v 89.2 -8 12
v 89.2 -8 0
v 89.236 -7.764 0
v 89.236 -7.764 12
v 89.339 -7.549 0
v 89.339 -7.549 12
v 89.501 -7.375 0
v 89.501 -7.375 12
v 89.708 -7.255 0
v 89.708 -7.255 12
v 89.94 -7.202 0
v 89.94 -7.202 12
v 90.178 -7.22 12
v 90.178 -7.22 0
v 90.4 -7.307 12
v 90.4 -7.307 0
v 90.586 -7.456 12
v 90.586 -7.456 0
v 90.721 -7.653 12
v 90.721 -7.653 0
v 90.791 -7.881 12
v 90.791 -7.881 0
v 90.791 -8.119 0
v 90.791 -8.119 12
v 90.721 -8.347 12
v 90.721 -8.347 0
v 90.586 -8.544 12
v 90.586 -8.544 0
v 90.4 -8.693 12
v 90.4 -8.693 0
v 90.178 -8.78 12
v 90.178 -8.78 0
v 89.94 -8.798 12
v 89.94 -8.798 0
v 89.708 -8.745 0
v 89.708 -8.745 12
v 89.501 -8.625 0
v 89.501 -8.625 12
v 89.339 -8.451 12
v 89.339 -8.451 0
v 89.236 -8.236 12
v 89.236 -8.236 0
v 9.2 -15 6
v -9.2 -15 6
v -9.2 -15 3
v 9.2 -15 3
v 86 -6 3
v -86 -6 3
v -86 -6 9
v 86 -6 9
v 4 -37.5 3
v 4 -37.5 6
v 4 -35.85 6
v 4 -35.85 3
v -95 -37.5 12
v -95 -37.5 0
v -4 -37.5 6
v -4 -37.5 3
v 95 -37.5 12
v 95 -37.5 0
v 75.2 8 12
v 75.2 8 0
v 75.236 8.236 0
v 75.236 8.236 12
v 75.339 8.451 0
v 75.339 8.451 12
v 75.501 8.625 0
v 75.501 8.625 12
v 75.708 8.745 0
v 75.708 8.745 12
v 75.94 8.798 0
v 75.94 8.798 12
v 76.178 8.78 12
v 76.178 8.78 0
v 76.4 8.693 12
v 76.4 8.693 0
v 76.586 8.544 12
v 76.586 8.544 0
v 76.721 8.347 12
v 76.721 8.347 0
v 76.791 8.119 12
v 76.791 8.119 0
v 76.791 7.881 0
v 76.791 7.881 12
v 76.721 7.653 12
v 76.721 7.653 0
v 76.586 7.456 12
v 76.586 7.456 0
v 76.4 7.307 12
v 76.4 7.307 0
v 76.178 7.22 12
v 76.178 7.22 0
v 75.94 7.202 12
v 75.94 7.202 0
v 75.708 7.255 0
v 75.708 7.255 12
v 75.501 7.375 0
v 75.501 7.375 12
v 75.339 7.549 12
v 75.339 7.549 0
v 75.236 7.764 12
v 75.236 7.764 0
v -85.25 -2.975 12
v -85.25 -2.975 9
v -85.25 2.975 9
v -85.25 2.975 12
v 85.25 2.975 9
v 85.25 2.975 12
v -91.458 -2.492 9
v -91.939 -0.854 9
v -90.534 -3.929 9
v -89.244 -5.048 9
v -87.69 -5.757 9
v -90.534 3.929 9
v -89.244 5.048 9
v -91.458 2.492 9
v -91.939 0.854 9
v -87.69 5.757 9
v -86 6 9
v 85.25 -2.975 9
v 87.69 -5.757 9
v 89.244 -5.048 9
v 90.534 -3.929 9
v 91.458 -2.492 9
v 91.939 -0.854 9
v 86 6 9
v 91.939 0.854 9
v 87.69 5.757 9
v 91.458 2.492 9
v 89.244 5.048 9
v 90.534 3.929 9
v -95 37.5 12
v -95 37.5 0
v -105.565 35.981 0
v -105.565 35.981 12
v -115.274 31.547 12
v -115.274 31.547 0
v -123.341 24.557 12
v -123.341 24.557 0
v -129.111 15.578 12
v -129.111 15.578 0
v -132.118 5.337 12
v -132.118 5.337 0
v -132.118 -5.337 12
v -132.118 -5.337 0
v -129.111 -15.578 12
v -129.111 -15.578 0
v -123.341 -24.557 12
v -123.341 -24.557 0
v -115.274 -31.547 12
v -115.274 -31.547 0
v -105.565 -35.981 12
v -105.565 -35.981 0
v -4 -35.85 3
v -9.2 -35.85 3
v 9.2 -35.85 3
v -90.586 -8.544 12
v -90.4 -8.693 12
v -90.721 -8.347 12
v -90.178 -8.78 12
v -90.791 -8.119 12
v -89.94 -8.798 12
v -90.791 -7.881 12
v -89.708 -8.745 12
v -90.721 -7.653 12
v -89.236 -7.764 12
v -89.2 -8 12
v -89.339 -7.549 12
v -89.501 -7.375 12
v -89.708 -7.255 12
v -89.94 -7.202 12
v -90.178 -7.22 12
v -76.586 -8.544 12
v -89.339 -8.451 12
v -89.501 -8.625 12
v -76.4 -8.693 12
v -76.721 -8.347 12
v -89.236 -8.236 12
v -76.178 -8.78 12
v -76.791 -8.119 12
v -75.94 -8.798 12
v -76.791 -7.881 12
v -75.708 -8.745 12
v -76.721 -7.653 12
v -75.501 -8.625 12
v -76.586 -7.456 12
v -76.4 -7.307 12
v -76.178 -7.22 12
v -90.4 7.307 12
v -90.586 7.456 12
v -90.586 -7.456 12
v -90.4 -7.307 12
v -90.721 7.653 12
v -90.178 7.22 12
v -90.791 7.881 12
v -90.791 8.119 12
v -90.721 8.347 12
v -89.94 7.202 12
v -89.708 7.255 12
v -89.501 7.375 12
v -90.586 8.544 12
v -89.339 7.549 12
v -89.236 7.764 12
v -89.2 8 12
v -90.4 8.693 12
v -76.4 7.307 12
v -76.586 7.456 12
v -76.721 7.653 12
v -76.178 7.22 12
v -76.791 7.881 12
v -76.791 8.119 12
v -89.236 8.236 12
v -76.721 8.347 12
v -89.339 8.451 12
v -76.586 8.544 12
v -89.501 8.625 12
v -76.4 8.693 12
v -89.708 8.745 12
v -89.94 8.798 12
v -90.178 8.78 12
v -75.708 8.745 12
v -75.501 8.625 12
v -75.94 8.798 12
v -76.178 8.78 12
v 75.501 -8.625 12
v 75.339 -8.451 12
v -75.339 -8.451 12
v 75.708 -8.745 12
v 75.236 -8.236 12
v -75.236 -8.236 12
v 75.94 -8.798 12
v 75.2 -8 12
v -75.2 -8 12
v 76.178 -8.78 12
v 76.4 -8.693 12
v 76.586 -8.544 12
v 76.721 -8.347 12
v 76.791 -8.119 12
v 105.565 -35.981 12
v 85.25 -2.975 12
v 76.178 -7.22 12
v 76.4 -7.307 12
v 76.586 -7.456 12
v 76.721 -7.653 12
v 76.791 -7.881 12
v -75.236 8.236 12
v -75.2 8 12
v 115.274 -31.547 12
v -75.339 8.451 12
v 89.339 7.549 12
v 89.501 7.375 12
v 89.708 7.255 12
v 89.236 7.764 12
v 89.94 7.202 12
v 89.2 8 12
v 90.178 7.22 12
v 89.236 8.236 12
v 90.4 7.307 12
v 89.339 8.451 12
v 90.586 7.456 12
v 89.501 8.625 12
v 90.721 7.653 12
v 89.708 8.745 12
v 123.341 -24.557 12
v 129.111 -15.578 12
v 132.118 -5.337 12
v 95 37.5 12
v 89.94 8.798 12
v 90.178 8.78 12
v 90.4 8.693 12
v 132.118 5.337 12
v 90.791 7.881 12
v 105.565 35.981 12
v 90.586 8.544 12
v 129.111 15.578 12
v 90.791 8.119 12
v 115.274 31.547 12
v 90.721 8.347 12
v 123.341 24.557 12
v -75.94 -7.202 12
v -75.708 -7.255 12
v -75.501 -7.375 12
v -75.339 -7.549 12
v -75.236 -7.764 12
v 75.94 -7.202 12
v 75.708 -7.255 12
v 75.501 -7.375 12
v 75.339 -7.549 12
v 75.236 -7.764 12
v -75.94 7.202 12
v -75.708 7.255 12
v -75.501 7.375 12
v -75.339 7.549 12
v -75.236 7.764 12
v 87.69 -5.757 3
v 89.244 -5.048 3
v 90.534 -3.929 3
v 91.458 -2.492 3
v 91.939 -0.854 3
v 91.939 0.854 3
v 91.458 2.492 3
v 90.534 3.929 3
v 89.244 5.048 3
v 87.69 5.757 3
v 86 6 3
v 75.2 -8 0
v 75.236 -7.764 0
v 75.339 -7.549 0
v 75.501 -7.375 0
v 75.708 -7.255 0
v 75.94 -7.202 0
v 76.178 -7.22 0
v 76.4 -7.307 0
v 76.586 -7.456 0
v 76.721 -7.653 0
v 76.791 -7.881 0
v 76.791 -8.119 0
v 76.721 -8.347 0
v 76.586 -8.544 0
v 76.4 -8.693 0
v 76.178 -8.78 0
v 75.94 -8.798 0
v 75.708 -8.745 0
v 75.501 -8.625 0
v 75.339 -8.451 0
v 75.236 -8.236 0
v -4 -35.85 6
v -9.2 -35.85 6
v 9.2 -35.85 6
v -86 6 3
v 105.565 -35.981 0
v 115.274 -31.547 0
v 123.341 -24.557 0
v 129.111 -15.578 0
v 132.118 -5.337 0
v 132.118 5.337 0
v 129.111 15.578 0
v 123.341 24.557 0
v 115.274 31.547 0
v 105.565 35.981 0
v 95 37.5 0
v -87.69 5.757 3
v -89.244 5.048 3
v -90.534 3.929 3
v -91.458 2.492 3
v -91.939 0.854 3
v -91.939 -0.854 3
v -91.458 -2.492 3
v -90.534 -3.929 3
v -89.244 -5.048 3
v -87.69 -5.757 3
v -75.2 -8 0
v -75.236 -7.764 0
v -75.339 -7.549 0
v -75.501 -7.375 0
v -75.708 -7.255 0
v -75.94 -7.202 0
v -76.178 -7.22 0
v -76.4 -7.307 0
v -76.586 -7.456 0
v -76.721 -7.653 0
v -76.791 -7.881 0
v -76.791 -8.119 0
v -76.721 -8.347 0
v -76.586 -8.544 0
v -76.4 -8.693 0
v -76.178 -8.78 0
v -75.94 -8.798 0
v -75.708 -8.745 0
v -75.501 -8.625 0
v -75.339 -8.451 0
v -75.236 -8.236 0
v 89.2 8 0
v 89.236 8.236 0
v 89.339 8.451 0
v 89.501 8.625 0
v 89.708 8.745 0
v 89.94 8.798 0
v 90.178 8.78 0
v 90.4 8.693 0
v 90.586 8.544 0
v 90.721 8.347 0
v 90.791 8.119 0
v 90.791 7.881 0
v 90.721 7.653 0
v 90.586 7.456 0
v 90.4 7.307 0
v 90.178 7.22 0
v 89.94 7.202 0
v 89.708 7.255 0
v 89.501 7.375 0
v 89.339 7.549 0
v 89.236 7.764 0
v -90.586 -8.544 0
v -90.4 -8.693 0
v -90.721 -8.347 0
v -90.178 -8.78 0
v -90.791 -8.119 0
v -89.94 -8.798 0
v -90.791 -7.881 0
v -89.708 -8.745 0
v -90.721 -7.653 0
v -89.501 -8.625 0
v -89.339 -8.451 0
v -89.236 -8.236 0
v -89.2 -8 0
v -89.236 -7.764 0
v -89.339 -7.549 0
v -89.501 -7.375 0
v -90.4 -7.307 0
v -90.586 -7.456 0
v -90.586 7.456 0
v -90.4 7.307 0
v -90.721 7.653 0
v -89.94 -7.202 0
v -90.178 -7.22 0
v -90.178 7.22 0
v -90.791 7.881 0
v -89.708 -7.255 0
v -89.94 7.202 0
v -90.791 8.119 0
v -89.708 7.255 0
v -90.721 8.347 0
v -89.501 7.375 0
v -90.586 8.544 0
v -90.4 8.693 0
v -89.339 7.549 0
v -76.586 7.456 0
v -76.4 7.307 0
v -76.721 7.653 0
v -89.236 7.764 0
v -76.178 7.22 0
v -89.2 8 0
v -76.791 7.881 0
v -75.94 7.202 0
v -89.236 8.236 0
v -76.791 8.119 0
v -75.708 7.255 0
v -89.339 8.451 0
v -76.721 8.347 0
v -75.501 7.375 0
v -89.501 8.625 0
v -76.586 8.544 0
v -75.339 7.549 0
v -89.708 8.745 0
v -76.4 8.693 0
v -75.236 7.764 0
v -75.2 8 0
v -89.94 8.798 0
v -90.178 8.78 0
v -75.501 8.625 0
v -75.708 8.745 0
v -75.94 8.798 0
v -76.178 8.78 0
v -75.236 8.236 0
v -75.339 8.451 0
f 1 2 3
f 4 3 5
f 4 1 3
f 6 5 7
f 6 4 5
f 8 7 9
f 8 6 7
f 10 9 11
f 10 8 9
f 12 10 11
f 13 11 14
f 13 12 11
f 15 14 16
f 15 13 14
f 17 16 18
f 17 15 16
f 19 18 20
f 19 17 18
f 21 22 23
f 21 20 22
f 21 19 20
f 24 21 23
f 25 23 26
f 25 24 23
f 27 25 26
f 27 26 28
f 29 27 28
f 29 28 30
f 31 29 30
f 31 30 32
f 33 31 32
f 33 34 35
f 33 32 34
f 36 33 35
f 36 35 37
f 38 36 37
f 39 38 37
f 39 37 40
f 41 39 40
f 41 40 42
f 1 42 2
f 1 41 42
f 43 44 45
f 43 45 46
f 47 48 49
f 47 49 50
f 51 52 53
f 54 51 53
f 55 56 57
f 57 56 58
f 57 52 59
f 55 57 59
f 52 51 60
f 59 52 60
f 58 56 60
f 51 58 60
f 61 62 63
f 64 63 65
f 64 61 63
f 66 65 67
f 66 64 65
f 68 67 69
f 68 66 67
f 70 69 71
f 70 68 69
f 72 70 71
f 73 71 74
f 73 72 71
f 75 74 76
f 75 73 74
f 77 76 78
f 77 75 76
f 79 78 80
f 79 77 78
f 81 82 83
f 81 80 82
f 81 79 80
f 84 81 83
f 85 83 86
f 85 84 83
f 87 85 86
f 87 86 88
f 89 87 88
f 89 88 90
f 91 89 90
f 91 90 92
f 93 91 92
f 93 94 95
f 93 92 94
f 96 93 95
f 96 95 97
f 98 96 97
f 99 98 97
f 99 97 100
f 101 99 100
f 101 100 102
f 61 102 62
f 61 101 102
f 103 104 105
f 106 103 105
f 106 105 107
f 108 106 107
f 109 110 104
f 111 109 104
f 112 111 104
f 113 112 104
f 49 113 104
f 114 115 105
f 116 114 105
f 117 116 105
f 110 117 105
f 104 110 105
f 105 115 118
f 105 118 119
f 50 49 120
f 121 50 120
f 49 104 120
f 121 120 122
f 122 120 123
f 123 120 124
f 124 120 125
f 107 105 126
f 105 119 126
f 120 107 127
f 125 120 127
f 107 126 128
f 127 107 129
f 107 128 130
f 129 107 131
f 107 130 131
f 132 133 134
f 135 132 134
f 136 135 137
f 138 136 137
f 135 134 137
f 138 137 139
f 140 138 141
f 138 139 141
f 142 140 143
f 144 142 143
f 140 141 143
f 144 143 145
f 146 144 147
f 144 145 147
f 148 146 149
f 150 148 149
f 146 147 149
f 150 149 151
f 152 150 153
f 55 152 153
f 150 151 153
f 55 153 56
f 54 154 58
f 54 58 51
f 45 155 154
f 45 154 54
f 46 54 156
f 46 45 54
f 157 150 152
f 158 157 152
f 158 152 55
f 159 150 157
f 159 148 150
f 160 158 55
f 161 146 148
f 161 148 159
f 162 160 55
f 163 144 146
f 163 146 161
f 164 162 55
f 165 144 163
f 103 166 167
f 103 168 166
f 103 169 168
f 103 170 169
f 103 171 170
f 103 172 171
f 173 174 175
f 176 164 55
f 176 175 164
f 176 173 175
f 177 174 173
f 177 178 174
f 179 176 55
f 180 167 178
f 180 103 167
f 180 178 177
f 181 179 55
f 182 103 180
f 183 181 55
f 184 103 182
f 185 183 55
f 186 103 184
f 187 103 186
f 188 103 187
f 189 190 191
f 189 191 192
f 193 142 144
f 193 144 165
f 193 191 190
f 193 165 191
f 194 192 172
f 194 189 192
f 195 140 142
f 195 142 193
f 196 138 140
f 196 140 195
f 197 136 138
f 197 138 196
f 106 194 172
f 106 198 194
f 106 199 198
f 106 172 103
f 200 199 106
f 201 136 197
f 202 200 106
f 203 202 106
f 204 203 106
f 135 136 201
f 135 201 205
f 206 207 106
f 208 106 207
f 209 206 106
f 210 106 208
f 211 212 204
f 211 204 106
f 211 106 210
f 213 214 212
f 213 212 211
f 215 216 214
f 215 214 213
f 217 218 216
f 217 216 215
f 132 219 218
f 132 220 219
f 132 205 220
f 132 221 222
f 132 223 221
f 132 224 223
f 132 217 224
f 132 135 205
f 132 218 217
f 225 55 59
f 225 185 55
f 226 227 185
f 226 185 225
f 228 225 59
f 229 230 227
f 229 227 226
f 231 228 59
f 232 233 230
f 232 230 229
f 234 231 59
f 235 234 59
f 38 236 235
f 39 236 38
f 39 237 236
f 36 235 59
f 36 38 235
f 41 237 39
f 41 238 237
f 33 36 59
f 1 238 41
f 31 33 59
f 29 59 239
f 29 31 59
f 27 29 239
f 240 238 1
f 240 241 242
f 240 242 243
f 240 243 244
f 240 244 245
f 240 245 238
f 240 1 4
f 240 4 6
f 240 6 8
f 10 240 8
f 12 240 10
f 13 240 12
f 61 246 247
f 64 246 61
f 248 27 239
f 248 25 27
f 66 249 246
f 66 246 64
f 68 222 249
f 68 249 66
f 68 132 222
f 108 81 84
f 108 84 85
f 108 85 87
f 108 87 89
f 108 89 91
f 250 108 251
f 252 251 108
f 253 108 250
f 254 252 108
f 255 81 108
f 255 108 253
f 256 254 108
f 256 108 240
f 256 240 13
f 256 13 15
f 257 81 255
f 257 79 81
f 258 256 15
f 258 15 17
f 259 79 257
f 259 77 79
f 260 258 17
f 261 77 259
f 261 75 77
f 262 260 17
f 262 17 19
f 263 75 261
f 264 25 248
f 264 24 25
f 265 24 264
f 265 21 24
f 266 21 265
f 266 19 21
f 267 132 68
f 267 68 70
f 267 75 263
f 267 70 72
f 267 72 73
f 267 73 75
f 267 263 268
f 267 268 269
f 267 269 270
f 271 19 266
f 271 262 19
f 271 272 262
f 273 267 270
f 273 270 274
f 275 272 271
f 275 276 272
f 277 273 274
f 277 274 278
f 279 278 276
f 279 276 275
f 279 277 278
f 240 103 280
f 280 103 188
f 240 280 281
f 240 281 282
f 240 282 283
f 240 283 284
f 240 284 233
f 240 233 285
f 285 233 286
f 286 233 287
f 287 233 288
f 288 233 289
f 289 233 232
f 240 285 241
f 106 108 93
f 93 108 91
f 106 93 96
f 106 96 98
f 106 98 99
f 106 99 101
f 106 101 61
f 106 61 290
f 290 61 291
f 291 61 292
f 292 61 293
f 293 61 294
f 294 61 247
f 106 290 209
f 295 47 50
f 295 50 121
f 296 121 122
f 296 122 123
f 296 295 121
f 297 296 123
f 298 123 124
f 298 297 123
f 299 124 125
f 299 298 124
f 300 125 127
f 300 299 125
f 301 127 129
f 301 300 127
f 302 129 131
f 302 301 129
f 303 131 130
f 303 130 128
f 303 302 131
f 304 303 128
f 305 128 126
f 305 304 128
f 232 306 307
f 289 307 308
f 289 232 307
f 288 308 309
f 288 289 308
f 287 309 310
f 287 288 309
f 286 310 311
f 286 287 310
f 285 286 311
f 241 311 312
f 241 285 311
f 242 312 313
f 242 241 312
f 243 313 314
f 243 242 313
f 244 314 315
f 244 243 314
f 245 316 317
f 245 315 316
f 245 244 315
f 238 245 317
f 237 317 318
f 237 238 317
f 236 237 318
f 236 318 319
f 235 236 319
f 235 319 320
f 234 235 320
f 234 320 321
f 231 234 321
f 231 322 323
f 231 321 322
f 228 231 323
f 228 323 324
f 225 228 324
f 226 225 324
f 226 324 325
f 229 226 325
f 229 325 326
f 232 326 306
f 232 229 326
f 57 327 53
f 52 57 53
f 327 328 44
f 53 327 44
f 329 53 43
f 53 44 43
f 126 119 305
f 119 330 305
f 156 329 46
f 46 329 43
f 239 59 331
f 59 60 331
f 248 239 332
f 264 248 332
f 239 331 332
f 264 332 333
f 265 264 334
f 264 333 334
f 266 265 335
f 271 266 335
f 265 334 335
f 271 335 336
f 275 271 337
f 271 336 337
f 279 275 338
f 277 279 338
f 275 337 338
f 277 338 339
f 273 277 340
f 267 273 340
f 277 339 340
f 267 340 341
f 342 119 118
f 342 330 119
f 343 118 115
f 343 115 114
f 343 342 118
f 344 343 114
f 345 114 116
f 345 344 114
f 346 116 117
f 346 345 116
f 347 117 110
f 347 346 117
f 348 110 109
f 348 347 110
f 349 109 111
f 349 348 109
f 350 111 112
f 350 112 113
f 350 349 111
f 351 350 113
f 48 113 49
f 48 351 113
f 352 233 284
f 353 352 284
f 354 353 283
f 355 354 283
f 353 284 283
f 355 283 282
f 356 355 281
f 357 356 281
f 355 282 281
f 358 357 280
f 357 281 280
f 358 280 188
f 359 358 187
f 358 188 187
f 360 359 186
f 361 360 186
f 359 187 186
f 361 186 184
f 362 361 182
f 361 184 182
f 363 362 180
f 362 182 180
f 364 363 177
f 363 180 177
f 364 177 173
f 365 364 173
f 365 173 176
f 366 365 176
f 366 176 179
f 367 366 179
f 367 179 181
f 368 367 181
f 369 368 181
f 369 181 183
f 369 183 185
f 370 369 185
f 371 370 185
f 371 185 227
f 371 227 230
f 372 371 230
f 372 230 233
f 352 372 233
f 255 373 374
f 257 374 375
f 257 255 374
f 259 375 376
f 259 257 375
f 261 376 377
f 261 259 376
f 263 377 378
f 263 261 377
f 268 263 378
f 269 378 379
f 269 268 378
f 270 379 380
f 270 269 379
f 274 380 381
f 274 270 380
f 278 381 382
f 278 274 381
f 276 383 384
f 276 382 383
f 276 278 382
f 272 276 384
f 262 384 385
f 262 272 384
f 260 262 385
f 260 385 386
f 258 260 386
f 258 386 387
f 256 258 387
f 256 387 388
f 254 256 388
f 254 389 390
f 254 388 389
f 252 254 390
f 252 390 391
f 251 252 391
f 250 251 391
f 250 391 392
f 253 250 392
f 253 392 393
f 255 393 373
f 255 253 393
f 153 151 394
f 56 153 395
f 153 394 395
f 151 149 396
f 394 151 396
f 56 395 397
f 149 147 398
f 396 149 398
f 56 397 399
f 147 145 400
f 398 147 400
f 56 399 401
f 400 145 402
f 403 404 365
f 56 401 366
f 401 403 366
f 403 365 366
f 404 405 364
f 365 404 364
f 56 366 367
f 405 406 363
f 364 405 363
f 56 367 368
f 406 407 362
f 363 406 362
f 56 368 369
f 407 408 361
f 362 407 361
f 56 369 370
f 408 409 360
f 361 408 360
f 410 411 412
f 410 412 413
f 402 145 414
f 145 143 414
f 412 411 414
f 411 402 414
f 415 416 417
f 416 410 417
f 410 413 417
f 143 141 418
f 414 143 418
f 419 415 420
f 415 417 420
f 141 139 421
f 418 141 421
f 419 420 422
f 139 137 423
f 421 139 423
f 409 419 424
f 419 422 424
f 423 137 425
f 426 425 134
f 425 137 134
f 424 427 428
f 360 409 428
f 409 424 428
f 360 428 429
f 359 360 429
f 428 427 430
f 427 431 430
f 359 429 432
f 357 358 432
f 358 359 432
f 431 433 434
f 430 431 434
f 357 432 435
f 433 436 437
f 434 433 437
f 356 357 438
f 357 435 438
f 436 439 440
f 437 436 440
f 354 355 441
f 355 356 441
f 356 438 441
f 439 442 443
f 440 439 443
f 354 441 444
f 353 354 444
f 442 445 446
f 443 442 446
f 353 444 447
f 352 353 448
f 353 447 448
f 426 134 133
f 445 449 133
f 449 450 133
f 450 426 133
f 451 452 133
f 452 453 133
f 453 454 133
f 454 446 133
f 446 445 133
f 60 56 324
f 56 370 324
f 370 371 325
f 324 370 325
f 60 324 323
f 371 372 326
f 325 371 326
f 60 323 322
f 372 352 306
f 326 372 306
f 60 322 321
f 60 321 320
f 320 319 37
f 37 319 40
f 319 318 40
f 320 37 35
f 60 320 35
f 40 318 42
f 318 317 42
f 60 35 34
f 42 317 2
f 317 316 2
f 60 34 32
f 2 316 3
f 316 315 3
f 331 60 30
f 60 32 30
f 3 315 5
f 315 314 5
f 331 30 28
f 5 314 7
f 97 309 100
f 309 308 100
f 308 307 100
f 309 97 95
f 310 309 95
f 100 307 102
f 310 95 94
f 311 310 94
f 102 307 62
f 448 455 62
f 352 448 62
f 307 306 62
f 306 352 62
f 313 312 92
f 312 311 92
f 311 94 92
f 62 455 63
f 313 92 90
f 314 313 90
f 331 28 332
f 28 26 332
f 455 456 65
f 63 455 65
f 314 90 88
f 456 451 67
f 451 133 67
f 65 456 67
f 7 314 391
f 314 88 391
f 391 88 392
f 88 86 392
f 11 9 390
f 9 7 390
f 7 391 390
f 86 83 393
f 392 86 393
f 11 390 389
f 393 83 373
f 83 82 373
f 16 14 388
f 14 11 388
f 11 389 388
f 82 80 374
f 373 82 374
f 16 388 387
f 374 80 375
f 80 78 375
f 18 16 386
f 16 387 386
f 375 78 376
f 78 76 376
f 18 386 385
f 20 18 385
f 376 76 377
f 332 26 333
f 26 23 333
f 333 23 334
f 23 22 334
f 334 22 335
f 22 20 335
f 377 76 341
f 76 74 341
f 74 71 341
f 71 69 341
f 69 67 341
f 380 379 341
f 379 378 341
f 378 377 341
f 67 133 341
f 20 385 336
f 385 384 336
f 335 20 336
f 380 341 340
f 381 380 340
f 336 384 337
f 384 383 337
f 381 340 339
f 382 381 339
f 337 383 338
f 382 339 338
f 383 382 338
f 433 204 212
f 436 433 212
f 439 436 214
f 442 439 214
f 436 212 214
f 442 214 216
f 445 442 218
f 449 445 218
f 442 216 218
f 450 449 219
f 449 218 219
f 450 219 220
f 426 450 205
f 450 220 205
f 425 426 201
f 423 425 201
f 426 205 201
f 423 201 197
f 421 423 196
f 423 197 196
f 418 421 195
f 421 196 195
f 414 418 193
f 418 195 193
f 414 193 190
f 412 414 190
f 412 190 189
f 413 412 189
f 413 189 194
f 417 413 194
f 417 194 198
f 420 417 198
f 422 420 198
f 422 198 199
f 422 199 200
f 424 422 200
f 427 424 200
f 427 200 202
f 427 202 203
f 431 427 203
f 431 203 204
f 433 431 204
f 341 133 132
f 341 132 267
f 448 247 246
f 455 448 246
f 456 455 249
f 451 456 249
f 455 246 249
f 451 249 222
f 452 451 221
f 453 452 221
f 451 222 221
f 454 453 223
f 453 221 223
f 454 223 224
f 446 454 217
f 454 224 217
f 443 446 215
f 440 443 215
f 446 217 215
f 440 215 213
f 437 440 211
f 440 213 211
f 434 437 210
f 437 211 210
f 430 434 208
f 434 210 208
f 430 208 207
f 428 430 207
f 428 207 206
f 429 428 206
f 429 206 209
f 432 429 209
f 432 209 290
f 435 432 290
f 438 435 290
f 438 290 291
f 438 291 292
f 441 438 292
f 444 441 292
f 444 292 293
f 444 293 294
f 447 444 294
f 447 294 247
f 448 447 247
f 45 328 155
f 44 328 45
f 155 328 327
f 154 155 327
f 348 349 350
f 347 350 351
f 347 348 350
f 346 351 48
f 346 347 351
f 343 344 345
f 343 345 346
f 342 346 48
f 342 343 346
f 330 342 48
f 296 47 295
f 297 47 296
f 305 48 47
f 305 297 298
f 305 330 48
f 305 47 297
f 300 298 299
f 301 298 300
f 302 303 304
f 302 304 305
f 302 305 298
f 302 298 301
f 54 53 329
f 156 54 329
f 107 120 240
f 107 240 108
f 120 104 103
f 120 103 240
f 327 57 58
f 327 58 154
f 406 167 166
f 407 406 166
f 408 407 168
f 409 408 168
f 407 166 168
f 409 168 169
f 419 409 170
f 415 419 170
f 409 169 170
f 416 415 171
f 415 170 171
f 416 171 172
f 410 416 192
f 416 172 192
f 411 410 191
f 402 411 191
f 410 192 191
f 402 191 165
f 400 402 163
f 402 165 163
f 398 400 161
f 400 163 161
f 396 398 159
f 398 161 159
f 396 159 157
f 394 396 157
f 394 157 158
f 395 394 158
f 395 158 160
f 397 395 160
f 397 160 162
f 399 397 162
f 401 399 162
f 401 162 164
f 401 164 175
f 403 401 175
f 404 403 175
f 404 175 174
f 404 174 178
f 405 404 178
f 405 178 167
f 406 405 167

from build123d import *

# Parameters (mm, degrees)
PAD_DEPTH       = 6
POCKET_DEPTH    = 3
SKETCH002_W     = 18.4
SKETCH002_H     = 20.85
POCKET001_DEPTH = 3
SKETCH003_W     = 8
SKETCH003_H     = 1.65
POCKET002_DEPTH = 3
PAD001_DEPTH    = 3
SKETCH005_W     = 170.5
SKETCH005_H     = 5.95
PAD002_DEPTH    = 3
SKETCH007_R     = 0.8
POCKET003_DEPTH = 563.341185


with BuildPart() as part:
    # Sketch → Pad (new body)
    with BuildSketch(Plane.XY):
        with BuildLine():
            ThreePointArc((-95, 37.5), (-132.5, 0), (-95, -37.5))
            Line((-95, -37.5), (95, -37.5))
            ThreePointArc((95, -37.5), (132.5, 0), (95, 37.5))
            Line((-95, 37.5), (95, 37.5))
        make_face()
    extrude(amount=PAD_DEPTH)

    # Sketch001 (on Face6 of Pad) → Pocket (cut)
    with BuildSketch(Plane.XY.offset(6)):
        with BuildLine():
            ThreePointArc((-86, 6), (-92, 0), (-86, -6))
            Line((-86, -6), (86, -6))
            ThreePointArc((86, -6), (92, 0), (86, 6))
            Line((-86, 6), (86, 6))
        make_face()
    extrude(amount=-POCKET_DEPTH, mode=Mode.SUBTRACT)

    # Sketch002 (on Face5 of Pocket) → Pocket001 (cut)
    with BuildSketch(Plane.XY.offset(6)):
        with Locations((0, -25.425)):
            Rectangle(SKETCH002_W, SKETCH002_H)
    extrude(amount=-POCKET001_DEPTH, mode=Mode.SUBTRACT)

    # Sketch003 (on Face5 of Pocket001) → Pocket002 (cut)
    with BuildSketch(Plane.XY.offset(6)):
        with Locations((0, -36.675)):
            Rectangle(SKETCH003_W, SKETCH003_H)
    extrude(amount=-POCKET002_DEPTH, mode=Mode.SUBTRACT)

    # Sketch004 (on Face5 of Pocket002) → Pad001 (join)
    with BuildSketch(Plane.XY.offset(6)):
        with BuildLine():
            ThreePointArc((-95, 37.5), (-132.5, 0), (-95, -37.5))
            Line((-95, -37.5), (95, -37.5))
            ThreePointArc((95, -37.5), (132.5, 0), (95, 37.5))
            Line((-95, 37.5), (95, 37.5))
        make_face()
        with BuildLine():
            ThreePointArc((-86, 6), (-92, 0), (-86, -6))
            Line((-86, -6), (86, -6))
            ThreePointArc((86, -6), (92, 0), (86, 6))
            Line((-86, 6), (86, 6))
        make_face(mode=Mode.SUBTRACT)
    extrude(amount=PAD001_DEPTH)

    # Sketch005 (on Face12 of Pad001) → Pad002 (join)
    with BuildSketch(Plane.XY.offset(9)):
        with BuildLine():
            ThreePointArc((-95, 37.5), (-132.5, 0), (-95, -37.5))
            Line((-95, -37.5), (95, -37.5))
            ThreePointArc((95, -37.5), (132.5, 0), (95, 37.5))
            Line((-95, 37.5), (95, 37.5))
        make_face()
        Rectangle(SKETCH005_W, SKETCH005_H, mode=Mode.SUBTRACT)
    extrude(amount=PAD002_DEPTH)

    # Sketch007 (on Face20 of Pad002) → Pocket003 (cut, through all)
    with BuildSketch(Plane.XY.offset(12)):
        with Locations((-90, -8)):
            Circle(SKETCH007_R)
        with Locations((-90, 8)):
            Circle(SKETCH007_R)
        with Locations((-76, 8)):
            Circle(SKETCH007_R)
        with Locations((-76, -8)):
            Circle(SKETCH007_R)
    pocket003 = extrude(amount=-POCKET003_DEPTH, mode=Mode.SUBTRACT)

    # Mirrored: Pocket003 across Sketch007 V_Axis
    add(pocket003.mirror(Plane(origin=(0, 0, 12), x_dir=(0, 0, 1), z_dir=(1, 0, 0))), mode=Mode.SUBTRACT)


solid = part.part
